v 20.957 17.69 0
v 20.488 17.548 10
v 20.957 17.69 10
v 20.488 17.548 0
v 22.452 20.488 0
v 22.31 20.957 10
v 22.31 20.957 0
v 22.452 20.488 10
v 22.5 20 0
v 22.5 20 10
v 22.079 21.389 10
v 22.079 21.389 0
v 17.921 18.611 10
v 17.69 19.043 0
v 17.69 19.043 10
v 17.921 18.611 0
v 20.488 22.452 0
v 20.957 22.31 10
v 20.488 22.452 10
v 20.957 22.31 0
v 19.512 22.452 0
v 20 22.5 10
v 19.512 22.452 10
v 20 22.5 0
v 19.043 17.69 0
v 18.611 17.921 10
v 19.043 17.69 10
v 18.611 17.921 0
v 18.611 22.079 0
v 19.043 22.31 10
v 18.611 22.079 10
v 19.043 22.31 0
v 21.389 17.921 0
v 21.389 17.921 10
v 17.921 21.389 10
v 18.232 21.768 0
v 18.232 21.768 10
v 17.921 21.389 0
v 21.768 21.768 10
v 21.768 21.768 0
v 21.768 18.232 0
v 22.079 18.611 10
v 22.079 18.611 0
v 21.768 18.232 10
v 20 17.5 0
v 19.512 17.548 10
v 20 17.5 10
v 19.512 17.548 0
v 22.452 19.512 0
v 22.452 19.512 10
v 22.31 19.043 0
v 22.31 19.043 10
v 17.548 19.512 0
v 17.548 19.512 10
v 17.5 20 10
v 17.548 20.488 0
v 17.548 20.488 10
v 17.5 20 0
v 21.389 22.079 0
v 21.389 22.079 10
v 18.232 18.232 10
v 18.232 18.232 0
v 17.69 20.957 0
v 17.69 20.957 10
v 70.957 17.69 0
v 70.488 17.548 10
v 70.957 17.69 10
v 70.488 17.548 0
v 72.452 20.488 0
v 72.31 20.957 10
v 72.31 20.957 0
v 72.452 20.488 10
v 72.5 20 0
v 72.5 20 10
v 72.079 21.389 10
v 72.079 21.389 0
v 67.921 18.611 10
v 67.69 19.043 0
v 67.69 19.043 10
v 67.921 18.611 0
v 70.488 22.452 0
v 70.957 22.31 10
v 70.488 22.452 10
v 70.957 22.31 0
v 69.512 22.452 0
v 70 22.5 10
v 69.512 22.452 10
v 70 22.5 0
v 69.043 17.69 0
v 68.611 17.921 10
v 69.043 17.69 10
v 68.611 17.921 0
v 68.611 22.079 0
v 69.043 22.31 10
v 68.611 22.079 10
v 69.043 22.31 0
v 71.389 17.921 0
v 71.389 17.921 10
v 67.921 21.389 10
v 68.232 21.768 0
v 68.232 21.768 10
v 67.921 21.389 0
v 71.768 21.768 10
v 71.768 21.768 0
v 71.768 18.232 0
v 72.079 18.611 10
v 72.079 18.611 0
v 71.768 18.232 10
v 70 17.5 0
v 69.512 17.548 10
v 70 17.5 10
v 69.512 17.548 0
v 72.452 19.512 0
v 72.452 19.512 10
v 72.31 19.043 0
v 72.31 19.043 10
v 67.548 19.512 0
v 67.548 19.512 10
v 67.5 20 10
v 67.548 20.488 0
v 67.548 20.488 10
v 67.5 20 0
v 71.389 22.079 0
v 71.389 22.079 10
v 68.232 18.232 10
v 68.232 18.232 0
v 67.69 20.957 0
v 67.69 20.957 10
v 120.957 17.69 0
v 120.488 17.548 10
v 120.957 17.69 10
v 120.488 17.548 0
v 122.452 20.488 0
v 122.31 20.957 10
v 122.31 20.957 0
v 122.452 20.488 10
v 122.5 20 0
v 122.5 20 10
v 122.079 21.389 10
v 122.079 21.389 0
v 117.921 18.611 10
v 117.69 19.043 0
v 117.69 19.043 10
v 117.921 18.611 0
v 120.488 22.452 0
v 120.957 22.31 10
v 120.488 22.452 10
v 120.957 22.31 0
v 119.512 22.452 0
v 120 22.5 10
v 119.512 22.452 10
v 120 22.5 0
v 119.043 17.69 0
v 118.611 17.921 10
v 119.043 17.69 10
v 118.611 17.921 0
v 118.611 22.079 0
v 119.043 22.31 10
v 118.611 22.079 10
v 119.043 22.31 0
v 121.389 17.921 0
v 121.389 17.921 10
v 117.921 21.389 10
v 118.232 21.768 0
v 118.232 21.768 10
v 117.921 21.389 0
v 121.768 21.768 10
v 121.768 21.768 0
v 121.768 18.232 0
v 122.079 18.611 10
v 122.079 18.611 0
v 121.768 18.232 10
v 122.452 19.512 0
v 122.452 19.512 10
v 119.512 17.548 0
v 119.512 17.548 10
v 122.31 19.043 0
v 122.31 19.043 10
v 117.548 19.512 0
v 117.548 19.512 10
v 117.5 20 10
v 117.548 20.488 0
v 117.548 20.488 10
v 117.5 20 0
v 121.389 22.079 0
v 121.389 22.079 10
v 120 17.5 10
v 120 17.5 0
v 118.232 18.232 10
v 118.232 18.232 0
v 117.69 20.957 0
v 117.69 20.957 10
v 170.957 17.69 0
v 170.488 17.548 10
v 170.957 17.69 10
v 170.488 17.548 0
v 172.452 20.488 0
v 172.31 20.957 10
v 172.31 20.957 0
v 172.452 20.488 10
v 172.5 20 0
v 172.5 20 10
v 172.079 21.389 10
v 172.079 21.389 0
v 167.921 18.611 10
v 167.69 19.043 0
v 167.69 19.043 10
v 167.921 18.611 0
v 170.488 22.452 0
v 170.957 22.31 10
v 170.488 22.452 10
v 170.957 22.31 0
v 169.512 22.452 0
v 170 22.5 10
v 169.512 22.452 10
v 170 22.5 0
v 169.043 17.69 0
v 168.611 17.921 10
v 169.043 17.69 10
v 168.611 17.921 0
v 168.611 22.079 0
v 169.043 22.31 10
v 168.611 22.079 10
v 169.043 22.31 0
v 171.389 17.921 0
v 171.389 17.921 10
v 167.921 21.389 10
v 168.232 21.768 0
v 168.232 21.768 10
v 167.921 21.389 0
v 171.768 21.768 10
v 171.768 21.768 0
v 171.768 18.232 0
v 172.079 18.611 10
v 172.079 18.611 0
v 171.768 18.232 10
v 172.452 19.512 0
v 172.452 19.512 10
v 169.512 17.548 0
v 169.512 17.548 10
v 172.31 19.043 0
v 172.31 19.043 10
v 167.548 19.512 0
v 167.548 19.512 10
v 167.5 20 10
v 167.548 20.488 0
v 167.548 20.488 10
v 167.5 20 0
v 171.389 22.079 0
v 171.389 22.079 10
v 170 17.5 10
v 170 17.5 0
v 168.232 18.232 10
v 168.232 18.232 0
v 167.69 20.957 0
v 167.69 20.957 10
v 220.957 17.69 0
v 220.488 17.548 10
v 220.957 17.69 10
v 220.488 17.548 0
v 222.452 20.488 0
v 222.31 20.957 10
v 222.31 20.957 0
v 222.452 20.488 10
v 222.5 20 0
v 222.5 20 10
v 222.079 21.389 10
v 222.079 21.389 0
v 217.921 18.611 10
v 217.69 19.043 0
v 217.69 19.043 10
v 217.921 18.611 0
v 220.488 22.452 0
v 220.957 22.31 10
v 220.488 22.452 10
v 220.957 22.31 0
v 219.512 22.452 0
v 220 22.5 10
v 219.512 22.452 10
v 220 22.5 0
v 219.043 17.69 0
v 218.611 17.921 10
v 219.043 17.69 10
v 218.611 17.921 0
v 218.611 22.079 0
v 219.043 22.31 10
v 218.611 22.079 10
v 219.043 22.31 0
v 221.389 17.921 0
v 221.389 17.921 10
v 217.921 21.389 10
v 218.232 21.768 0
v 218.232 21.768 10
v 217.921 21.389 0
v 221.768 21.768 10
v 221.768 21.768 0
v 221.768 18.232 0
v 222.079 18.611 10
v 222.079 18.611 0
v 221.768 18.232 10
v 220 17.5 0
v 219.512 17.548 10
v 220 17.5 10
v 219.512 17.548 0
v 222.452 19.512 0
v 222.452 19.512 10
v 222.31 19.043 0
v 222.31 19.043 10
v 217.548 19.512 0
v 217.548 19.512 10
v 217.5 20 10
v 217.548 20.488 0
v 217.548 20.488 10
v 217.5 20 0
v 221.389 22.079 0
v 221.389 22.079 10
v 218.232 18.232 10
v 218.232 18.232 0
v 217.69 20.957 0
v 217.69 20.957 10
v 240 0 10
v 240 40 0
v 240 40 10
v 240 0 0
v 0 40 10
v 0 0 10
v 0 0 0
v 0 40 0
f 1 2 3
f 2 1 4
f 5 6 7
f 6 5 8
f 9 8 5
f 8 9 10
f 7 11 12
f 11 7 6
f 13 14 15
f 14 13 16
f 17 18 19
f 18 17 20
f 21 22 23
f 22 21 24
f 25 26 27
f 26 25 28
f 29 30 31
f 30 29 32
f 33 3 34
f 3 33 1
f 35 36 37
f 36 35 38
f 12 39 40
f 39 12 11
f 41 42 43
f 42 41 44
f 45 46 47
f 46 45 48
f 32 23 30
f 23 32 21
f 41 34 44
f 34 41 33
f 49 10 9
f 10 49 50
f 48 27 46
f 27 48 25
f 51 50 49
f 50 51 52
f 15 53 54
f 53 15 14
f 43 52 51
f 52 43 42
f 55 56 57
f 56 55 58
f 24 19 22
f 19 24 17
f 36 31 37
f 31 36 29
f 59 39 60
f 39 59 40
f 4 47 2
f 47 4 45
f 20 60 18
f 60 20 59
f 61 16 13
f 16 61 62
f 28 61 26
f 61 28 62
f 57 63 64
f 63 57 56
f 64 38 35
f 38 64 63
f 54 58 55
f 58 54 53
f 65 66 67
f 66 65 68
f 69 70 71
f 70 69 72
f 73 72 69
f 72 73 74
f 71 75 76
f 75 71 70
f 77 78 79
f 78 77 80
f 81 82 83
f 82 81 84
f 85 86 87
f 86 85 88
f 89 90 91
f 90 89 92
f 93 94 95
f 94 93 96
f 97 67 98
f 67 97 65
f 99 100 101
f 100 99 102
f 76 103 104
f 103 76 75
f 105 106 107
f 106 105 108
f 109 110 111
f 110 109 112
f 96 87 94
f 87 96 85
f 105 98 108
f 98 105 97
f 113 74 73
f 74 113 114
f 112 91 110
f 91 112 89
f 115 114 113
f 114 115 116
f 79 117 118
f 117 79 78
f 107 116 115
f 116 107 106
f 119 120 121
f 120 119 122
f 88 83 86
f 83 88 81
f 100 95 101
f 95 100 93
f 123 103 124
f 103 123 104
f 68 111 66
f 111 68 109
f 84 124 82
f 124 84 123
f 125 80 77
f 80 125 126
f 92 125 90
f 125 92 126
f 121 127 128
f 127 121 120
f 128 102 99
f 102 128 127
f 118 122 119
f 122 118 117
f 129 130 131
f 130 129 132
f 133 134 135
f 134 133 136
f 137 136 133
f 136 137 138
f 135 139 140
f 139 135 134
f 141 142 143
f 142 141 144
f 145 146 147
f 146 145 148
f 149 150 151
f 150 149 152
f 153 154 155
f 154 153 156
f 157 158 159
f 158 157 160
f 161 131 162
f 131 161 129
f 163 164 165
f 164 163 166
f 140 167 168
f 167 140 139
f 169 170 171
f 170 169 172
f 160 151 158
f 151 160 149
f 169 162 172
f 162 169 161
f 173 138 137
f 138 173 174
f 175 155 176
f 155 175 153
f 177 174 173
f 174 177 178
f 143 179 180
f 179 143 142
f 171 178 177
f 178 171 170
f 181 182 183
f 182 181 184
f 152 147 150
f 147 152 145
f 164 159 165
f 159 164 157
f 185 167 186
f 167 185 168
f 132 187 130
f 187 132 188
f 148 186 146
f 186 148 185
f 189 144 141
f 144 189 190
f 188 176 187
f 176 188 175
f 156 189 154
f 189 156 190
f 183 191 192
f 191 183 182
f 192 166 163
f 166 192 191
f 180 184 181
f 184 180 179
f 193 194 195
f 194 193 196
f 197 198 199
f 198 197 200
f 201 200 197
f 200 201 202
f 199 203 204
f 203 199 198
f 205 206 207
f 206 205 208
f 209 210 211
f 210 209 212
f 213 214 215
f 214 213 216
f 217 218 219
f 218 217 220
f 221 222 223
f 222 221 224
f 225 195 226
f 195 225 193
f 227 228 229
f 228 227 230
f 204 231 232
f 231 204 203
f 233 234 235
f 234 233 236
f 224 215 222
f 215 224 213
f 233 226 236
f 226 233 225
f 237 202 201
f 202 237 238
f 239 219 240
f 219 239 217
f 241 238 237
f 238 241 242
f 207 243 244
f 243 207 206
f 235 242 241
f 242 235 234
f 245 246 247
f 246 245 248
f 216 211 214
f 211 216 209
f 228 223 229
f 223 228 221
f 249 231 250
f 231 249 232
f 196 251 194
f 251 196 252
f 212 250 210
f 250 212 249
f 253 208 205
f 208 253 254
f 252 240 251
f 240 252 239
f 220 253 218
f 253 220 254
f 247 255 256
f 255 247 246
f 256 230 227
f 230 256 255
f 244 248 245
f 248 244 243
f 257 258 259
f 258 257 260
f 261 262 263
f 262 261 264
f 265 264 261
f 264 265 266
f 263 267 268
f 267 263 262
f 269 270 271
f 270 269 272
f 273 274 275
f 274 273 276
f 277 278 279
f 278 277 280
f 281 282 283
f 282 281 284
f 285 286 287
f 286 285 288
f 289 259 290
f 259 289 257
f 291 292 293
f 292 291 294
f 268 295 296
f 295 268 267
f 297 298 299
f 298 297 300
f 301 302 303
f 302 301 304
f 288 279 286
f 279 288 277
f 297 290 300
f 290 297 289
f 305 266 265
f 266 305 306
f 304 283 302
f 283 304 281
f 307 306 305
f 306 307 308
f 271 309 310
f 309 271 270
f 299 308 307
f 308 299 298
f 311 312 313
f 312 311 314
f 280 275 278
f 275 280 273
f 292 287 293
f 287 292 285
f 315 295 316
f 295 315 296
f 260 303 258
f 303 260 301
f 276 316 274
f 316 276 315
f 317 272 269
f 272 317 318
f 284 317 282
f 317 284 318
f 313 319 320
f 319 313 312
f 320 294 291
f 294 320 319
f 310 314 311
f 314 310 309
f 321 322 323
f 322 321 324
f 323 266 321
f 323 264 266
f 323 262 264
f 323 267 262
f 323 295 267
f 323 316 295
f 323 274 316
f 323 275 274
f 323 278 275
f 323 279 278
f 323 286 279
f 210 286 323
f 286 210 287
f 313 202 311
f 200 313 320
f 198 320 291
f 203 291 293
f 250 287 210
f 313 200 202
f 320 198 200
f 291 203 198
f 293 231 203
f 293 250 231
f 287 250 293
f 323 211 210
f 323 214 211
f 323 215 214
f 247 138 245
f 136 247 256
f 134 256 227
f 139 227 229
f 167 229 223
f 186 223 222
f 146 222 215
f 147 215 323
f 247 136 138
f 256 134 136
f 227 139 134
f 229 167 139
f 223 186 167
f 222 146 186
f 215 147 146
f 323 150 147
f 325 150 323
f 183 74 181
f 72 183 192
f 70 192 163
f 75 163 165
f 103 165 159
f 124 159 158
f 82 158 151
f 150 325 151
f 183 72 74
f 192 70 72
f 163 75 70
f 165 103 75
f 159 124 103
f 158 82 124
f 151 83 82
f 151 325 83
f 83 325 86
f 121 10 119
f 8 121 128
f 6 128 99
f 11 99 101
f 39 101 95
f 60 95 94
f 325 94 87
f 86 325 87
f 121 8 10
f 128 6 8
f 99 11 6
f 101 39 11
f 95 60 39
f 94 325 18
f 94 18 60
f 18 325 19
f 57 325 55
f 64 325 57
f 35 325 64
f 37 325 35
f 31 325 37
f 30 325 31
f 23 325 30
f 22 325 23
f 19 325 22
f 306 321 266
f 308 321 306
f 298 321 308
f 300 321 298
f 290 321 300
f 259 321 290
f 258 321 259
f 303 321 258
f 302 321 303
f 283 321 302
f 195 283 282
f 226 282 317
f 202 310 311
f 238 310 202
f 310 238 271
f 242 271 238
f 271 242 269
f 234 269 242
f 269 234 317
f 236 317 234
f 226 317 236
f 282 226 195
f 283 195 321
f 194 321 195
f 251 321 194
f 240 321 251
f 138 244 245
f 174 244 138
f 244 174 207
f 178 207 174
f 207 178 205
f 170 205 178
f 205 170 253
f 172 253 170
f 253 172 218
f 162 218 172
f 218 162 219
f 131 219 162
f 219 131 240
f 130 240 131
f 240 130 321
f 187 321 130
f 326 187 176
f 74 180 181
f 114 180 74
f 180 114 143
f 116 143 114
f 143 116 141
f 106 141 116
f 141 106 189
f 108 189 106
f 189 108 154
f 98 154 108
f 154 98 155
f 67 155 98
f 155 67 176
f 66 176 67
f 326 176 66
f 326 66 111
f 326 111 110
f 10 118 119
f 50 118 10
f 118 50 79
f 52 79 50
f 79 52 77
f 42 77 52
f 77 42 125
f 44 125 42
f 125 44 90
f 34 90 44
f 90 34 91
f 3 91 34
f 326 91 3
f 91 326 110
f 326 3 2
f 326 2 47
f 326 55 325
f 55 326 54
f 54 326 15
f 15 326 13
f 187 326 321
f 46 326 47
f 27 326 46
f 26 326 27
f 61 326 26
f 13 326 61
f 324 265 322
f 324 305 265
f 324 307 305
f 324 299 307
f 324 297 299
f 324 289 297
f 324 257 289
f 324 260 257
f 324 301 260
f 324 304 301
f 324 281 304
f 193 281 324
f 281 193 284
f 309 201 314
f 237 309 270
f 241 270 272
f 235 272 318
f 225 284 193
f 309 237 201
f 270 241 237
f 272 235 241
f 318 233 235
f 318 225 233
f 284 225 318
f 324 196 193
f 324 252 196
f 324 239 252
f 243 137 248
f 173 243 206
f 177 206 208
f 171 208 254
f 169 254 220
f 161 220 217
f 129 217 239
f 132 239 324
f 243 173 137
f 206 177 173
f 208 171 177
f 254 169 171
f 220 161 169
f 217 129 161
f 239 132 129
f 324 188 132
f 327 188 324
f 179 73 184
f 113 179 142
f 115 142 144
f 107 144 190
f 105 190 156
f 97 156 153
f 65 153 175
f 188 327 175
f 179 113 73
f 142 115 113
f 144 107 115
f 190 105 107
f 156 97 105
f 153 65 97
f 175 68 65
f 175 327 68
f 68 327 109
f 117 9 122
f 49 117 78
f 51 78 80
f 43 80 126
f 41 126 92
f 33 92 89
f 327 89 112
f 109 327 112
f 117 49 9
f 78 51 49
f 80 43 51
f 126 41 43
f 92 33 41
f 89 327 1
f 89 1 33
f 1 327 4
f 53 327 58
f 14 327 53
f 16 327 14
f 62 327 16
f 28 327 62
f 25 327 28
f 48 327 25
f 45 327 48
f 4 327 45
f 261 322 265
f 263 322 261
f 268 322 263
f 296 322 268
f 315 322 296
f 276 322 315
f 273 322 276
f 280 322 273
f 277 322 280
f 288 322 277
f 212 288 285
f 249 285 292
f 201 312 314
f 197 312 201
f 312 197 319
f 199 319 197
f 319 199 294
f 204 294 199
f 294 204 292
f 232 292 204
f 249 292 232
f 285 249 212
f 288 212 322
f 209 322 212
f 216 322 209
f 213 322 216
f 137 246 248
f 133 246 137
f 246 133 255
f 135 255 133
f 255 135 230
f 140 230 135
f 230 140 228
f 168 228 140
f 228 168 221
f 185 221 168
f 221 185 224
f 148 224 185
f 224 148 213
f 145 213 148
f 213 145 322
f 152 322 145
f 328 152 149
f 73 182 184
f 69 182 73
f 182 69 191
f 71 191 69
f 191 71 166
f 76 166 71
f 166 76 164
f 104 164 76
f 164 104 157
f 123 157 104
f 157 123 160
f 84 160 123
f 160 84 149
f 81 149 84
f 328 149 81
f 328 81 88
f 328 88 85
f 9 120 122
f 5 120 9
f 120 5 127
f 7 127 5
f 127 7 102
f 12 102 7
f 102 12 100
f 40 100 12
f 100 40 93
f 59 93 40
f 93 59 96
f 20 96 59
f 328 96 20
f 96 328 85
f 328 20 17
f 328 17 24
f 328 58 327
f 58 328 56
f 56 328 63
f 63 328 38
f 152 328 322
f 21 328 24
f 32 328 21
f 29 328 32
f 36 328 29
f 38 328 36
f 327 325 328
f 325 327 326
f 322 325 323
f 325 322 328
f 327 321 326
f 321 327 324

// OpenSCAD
$fn = 32;

// ----------------------------------------------------------------------
// Long rail: 200-250 mm mounting rail
// ----------------------------------------------------------------------

// --- parameters (mm) ---
rail_l = 240;             // rail length, X
rail_w = 40;              // rail width, Y
rail_t = 10;              // rail thickness, Z
hole_d = 5;               // mounting hole diameter
hole_start = 20;          // first hole offset from the end
hole_pitch = 50;          // hole pitch
holes = 5;                // number of holes

difference() {
  cube([rail_l, rail_w, rail_t]);
  for (i = [0 : holes - 1])
    translate([hole_start + i * hole_pitch, rail_w / 2, -1])
      cylinder(h = rail_t + 2, d = hole_d);
}
